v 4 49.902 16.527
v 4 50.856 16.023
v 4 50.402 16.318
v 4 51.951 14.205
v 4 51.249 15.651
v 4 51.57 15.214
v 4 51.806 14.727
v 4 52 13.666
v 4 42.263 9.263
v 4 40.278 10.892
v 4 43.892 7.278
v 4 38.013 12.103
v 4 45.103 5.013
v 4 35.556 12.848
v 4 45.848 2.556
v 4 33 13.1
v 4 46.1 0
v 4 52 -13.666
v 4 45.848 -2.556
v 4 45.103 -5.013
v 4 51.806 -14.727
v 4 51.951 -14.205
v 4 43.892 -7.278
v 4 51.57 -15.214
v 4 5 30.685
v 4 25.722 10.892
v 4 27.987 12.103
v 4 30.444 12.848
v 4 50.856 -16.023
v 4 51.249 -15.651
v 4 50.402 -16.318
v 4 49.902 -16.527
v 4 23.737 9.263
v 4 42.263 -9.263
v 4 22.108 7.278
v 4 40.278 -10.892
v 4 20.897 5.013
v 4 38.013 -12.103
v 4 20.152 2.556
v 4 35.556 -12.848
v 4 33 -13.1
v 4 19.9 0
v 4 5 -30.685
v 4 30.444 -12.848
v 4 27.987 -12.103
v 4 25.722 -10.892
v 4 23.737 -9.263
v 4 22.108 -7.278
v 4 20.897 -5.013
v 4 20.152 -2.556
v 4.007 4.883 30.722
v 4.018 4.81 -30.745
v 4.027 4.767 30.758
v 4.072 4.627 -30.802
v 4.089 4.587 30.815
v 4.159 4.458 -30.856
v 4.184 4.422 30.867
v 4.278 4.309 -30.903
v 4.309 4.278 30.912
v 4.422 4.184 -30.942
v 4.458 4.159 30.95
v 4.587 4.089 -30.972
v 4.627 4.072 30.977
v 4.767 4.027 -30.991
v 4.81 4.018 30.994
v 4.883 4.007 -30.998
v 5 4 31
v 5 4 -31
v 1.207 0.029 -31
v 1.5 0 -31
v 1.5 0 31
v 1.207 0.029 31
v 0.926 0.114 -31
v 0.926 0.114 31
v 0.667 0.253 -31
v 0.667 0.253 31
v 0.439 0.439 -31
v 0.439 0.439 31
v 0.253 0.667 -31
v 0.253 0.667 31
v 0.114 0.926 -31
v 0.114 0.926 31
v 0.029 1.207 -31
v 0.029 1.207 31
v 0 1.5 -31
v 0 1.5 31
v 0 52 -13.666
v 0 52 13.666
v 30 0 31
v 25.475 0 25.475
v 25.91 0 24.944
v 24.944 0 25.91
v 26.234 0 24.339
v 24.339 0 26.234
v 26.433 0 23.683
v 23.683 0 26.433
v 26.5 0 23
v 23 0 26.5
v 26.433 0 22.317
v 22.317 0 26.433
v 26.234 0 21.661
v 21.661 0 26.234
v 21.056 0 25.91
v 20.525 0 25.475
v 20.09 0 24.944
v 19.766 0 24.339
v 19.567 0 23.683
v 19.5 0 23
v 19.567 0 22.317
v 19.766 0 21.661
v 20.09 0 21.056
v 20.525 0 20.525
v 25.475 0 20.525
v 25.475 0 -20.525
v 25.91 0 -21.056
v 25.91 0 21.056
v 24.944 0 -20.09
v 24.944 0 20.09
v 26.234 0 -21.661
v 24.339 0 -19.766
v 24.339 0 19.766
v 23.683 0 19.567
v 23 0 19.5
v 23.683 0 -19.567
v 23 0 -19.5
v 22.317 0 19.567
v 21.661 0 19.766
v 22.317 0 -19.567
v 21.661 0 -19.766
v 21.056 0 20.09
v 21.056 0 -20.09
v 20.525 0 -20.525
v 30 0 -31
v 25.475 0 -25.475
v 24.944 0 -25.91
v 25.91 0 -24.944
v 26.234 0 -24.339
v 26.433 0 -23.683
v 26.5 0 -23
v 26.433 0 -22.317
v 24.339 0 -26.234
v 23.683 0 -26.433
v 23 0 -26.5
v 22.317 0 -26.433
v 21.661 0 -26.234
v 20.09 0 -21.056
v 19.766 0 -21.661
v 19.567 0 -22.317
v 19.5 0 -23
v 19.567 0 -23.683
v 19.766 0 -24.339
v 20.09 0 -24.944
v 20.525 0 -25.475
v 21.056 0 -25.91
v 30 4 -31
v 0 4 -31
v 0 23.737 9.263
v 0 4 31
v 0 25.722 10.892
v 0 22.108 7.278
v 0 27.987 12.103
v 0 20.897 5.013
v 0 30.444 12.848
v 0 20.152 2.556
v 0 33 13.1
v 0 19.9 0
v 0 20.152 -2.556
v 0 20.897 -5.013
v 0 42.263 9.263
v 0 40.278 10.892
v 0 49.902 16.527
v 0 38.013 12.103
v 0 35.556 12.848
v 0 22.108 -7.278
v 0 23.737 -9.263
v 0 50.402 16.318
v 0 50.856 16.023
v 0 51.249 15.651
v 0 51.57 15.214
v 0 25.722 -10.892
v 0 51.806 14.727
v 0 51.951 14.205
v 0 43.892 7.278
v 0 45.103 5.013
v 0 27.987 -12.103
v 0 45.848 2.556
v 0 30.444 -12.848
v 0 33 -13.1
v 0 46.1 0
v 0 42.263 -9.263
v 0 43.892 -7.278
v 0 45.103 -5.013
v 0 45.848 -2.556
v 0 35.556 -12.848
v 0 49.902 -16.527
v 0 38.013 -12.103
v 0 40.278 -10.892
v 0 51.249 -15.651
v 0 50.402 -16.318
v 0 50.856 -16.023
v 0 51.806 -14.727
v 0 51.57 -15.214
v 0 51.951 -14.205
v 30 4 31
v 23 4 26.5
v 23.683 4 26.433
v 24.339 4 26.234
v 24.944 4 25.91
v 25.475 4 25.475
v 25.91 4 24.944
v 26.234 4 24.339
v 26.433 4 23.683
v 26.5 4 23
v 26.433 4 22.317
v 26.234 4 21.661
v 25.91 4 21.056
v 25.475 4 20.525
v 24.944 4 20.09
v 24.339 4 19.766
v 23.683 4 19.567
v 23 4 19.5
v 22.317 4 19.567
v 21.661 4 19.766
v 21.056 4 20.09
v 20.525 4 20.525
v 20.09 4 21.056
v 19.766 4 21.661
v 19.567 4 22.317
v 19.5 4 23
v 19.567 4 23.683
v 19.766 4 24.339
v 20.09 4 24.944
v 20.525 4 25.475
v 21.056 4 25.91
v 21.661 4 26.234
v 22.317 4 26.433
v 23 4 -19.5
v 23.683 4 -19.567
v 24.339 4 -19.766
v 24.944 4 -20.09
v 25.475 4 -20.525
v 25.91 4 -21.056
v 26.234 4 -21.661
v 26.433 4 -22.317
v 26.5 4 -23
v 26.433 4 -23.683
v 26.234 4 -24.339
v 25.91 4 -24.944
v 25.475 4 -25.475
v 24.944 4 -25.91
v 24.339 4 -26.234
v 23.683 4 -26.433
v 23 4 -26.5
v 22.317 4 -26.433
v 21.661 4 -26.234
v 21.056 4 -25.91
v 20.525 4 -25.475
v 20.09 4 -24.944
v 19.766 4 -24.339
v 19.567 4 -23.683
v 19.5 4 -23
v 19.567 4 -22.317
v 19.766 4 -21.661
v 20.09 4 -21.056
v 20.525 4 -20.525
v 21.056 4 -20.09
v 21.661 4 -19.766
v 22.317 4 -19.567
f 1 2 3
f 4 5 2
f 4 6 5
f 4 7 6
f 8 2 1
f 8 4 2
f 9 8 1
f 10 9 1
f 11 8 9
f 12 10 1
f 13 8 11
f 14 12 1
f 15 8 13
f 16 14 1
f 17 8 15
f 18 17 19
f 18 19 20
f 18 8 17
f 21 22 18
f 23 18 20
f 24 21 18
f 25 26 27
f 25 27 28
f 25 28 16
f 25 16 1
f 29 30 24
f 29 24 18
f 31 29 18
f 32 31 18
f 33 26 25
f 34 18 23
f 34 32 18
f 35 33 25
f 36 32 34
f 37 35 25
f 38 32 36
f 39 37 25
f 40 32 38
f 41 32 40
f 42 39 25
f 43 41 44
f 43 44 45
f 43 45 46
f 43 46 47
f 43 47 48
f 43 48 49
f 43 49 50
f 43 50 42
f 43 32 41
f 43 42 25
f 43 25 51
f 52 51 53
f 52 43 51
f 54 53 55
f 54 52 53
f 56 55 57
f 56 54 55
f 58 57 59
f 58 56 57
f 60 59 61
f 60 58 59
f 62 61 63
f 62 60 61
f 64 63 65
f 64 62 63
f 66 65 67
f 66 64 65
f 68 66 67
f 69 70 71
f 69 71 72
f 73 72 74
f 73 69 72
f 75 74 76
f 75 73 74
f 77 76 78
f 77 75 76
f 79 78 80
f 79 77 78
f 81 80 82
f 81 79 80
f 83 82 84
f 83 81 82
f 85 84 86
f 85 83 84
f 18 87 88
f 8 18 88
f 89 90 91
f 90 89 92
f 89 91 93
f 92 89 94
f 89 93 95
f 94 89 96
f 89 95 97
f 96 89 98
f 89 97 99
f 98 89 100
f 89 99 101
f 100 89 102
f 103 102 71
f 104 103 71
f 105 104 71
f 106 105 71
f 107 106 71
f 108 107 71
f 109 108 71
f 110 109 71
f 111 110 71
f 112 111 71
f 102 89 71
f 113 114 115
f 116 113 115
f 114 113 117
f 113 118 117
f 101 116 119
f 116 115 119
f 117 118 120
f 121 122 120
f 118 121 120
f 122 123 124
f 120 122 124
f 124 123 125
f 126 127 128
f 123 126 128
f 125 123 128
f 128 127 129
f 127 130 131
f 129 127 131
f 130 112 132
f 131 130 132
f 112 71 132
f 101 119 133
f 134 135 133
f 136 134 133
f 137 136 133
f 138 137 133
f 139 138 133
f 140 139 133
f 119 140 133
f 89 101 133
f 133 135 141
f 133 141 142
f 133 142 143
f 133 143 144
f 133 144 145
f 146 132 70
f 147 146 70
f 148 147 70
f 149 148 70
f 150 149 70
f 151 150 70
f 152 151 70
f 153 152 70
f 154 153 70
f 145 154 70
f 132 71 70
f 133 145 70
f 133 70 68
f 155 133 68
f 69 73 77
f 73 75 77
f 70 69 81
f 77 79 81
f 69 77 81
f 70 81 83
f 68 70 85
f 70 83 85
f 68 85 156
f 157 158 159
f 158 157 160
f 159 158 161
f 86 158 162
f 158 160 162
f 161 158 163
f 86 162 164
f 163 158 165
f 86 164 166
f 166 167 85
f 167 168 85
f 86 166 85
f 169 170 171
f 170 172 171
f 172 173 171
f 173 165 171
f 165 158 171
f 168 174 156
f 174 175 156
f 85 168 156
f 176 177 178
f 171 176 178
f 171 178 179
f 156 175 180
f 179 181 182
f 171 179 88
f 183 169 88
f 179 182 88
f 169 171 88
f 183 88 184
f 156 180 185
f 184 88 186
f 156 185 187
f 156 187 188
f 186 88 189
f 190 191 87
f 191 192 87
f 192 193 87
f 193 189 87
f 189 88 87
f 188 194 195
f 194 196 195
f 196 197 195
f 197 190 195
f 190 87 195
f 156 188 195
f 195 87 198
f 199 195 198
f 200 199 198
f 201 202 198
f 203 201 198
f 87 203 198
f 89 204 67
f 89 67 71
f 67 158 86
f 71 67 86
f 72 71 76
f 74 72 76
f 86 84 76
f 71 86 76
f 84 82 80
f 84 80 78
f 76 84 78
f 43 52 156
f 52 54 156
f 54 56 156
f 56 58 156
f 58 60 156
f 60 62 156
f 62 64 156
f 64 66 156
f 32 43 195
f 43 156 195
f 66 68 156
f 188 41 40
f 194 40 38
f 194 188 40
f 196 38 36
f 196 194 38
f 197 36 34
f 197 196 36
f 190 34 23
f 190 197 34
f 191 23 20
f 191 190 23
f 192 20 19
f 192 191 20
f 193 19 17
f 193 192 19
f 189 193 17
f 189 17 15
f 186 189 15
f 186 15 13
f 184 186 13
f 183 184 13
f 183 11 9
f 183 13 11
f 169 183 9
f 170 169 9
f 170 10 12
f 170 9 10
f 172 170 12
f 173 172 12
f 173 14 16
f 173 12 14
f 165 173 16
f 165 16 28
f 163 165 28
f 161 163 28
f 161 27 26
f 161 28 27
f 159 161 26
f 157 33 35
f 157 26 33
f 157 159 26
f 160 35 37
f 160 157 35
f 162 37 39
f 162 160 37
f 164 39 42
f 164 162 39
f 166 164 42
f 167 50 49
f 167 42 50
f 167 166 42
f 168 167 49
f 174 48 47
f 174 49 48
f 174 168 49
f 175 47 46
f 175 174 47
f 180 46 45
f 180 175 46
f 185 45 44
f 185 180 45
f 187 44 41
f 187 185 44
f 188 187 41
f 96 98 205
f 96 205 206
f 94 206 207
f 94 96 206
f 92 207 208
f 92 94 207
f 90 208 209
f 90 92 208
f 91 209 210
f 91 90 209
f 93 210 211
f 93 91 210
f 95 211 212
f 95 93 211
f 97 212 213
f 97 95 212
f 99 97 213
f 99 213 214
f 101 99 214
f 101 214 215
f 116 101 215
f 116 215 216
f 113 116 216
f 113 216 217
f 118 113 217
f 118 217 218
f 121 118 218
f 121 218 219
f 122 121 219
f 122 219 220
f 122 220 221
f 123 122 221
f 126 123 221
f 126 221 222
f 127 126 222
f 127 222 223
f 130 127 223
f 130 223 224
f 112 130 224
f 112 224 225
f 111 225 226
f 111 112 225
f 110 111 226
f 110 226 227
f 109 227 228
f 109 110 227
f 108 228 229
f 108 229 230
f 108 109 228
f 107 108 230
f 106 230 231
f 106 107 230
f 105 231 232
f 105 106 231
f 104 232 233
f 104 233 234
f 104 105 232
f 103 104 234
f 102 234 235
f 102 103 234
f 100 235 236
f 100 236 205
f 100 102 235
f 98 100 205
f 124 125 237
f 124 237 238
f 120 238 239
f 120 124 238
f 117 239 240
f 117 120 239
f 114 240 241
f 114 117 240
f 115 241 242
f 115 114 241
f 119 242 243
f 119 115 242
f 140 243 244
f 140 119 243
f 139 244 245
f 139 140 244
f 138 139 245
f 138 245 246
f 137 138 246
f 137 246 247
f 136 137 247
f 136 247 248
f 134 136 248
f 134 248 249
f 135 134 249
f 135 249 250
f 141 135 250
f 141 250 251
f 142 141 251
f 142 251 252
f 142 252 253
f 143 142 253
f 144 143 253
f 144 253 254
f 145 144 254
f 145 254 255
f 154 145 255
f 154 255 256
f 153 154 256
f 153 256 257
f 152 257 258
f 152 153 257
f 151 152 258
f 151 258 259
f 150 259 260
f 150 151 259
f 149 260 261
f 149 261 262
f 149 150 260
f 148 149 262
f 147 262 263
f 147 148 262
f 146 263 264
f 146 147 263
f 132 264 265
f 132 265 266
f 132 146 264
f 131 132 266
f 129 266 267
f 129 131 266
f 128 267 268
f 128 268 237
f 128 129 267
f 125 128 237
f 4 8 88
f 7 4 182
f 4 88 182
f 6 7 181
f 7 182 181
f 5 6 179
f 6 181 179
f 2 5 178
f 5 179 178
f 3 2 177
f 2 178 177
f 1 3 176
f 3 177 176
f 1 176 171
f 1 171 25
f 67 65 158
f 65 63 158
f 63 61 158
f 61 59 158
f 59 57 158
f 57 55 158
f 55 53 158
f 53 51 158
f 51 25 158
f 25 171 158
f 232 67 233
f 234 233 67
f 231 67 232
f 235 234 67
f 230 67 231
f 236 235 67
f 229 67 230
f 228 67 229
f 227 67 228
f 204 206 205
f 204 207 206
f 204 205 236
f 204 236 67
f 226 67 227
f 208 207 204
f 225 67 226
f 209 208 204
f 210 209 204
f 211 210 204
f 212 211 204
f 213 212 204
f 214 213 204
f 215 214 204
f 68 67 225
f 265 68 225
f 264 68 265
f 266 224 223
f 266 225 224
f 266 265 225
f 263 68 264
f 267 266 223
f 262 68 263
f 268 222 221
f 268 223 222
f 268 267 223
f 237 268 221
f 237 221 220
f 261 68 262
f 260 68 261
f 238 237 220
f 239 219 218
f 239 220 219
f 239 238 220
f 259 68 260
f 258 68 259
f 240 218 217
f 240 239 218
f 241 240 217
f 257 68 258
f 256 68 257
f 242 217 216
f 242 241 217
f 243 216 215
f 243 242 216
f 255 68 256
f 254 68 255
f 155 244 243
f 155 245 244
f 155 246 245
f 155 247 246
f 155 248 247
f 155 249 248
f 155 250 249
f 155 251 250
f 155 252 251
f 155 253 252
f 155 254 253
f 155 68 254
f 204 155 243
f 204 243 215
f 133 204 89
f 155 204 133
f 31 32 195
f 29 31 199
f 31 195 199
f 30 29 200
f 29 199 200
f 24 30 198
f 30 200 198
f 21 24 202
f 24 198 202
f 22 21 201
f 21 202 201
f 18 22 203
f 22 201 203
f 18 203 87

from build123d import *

# Parameters (mm, degrees)
SKETCH_1_R               = 13.1
EXTRUDE_1_DEPTH          = 30
CUT_EXTRUDE_1_DEPTH      = 31
CUT_EXTRUDE_1_DEPTH_BACK = 31
CUT_EXTRUDE_2_DEPTH      = 31
CUT_EXTRUDE_2_DEPTH_BACK = 31
CUT_EXTRUDE_3_DEPTH      = 4
CUT_EXTRUDE_3_DEPTH_BACK = 4
SKETCH_4_R               = 3.5
CUT_EXTRUDE_4_DEPTH      = 4
CUT_EXTRUDE_4_DEPTH_BACK = 4
SKETCH_5_R               = 3.5


with BuildPart() as part:
    # 草图1 → 凸台-拉伸1 (new body)
    with BuildSketch(Plane(origin=(0, 0, 0), x_dir=(0, 0, -1), z_dir=(1, 0, 0))):
        with BuildLine():
            Line((-31, 0), (31, 0))
            Line((31, 0), (31, 4))
            Line((31, 4), (16.527117977, 49.902117399))
            ThreePointArc((16.527117977, 49.902117399), (15.43989607, 51.419333813), (13.665967125, 52))
            Line((13.665967125, 52), (-13.665967125, 52))
            ThreePointArc((-13.665967125, 52), (-15.43989607, 51.419333813), (-16.527117977, 49.902117399))
            Line((-16.527117977, 49.902117399), (-31, 4))
            Line((-31, 4), (-31, 0))
        make_face()
        with Locations((0, 33)):
            Circle(SKETCH_1_R, mode=Mode.SUBTRACT)
    extrude(amount=EXTRUDE_1_DEPTH)

    # 草图2 → 切除-拉伸1 (cut, two sides: drawn at the far end of the back side and taken through both)
    with BuildSketch(Plane.XY.offset(-CUT_EXTRUDE_1_DEPTH_BACK)):
        with BuildLine():
            Line((5, 4), (30, 4))
            Line((30, 4), (30, 52))
            Line((30, 52), (4, 52))
            Line((4, 52), (4, 5))
            ThreePointArc((4, 5), (4.292893219, 4.292893219), (5, 4))
        make_face()
    extrude(amount=CUT_EXTRUDE_1_DEPTH + CUT_EXTRUDE_1_DEPTH_BACK, mode=Mode.SUBTRACT)

    # 草图3 → 切除-拉伸2 (cut, two sides: drawn at the far end of the back side and taken through both)
    with BuildSketch(Plane.XY.offset(-CUT_EXTRUDE_2_DEPTH_BACK)):
        with BuildLine():
            Line((-1, -1), (1.5, -1))
            Line((1.5, -1), (1.5, 0))
            ThreePointArc((1.5, 0), (0.439339828, 0.439339828), (0, 1.5))
            Line((0, 1.5), (-1, 1.5))
            Line((-1, 1.5), (-1, -1))
        make_face()
    extrude(amount=CUT_EXTRUDE_2_DEPTH + CUT_EXTRUDE_2_DEPTH_BACK, mode=Mode.SUBTRACT)

    # 草图4 → 切除-拉伸3 (cut, two sides: drawn at the far end of the back side and taken through both)
    with BuildSketch(Plane(origin=(0, 0, 0), x_dir=(1, 0, 0), z_dir=(0, 1, 0)).offset(-CUT_EXTRUDE_3_DEPTH_BACK)):
        with Locations((23, 23)):
            Circle(SKETCH_4_R)
    extrude(amount=CUT_EXTRUDE_3_DEPTH + CUT_EXTRUDE_3_DEPTH_BACK, mode=Mode.SUBTRACT)

    # 草图5 → 切除-拉伸4 (cut, two sides: drawn at the far end of the back side and taken through both)
    with BuildSketch(Plane(origin=(0, 0, 0), x_dir=(1, 0, 0), z_dir=(0, 1, 0)).offset(-CUT_EXTRUDE_4_DEPTH_BACK)):
        with Locations((23, -23)):
            Circle(SKETCH_5_R)
    extrude(amount=CUT_EXTRUDE_4_DEPTH + CUT_EXTRUDE_4_DEPTH_BACK, mode=Mode.SUBTRACT)


solid = part.part
